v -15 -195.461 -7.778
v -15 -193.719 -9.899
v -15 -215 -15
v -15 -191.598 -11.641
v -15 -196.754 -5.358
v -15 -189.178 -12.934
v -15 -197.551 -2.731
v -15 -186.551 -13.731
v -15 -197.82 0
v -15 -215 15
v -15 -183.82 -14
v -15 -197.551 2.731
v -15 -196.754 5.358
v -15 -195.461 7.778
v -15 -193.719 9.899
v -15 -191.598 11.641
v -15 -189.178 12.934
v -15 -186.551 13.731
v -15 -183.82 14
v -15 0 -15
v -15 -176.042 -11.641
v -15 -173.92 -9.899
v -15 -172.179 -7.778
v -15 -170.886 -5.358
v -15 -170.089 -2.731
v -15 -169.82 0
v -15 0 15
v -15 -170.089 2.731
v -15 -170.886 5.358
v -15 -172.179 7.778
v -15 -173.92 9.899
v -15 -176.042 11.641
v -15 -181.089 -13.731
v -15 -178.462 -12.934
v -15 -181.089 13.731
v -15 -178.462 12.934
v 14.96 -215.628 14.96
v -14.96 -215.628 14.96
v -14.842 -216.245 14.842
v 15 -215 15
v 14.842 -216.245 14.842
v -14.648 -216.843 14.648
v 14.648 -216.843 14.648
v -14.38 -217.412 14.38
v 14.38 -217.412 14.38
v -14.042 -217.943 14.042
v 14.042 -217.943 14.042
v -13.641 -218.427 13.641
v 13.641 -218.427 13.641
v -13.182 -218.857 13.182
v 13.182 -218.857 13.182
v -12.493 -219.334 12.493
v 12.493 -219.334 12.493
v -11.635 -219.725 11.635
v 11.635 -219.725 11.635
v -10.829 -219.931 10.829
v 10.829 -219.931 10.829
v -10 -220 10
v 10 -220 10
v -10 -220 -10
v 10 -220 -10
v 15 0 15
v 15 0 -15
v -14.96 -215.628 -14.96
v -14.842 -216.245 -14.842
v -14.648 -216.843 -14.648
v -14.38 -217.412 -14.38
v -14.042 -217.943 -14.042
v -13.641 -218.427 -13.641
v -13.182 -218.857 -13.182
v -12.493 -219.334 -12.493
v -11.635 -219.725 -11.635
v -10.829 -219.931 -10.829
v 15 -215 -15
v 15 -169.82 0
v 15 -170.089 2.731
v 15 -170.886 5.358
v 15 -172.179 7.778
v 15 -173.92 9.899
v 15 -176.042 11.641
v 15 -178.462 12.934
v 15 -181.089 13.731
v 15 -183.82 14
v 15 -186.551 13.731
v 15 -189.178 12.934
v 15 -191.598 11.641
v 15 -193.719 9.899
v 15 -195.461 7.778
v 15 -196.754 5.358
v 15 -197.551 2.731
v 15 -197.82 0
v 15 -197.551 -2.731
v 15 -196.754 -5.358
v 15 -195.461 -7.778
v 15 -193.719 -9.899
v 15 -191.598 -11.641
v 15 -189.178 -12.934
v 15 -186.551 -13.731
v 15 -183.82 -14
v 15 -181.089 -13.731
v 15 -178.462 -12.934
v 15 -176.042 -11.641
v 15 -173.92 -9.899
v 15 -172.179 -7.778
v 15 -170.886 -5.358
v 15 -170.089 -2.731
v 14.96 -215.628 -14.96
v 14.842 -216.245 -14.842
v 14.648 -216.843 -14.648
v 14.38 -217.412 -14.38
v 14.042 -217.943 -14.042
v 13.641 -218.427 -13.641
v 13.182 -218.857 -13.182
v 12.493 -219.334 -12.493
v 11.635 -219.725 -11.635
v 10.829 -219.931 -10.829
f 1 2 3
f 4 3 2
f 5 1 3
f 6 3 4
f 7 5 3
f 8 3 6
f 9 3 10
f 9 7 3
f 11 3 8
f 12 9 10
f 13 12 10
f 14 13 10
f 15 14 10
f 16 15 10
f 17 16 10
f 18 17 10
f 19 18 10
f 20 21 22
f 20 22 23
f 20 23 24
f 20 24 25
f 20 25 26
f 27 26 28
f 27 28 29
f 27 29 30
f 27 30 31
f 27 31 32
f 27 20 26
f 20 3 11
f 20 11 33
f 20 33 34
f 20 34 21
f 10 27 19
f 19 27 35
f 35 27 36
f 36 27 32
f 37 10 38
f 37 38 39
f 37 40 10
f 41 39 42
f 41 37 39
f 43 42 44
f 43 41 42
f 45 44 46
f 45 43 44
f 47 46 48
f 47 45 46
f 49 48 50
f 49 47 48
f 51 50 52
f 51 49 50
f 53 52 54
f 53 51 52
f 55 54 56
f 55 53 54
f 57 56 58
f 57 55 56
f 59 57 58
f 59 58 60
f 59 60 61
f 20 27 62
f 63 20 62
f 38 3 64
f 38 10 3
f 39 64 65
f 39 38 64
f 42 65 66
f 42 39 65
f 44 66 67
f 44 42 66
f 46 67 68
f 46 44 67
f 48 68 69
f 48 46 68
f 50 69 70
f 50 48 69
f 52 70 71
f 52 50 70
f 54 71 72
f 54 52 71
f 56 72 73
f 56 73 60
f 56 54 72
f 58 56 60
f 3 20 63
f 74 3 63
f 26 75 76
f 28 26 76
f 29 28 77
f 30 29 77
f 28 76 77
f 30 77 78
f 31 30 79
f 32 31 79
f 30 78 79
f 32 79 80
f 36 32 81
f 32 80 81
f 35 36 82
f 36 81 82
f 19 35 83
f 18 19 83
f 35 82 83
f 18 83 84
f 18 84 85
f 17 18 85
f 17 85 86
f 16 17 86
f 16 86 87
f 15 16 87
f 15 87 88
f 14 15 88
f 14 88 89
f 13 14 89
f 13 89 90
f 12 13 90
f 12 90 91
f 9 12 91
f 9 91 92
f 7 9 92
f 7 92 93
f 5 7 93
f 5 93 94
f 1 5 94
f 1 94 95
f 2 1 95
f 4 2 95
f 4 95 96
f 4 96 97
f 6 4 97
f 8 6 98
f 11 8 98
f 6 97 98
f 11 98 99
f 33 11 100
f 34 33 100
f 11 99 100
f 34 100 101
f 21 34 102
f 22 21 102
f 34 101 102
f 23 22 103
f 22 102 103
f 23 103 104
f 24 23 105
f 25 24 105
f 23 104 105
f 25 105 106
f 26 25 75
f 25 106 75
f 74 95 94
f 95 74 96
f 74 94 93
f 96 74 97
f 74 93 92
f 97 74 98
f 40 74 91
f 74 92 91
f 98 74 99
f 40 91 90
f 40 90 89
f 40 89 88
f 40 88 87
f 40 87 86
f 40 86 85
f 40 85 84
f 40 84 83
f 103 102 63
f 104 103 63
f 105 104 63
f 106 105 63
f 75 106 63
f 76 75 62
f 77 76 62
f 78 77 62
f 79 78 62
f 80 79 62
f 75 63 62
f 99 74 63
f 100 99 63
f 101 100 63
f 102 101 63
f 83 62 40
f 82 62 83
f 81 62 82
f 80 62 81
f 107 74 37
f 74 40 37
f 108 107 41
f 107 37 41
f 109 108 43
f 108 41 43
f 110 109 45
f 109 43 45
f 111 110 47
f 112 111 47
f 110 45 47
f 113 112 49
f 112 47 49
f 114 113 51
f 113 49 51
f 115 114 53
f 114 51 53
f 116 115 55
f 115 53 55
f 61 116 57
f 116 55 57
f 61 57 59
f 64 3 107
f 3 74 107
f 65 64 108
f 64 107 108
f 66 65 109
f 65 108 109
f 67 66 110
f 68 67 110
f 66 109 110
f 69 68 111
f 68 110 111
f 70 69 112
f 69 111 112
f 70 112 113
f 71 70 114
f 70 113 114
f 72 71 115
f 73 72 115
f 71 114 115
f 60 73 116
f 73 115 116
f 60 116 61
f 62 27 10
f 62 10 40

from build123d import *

# Parameters (mm, degrees)
F0_W     = 30
F0_H     = 30
F1_DEPTH = 220
F2_R     = 5
F3_R     = 14
F4_DEPTH = 40


with BuildPart() as f1:
    # F0 (on Front) → F1 (new body)
    with BuildSketch(Plane.XZ):
        Rectangle(F0_W, F0_H)
    extrude(amount=F1_DEPTH)

    # F2
    f2_edges = [f1.edges().sort_by_distance(p)[0] for p in [
        (15, -220, 0),
        (-15, -220, 0),
        (0, -220, 15),
        (0, -220, -15),
    ]]
    fillet(f2_edges, radius=F2_R)

    # F3 (on face) → F4 (cut)
    with BuildSketch(Plane.YZ.offset(15)):
        with Locations((-183.8199943304, 0)):
            Circle(F3_R)
    extrude(amount=-F4_DEPTH, mode=Mode.SUBTRACT)


solid = f1.part
